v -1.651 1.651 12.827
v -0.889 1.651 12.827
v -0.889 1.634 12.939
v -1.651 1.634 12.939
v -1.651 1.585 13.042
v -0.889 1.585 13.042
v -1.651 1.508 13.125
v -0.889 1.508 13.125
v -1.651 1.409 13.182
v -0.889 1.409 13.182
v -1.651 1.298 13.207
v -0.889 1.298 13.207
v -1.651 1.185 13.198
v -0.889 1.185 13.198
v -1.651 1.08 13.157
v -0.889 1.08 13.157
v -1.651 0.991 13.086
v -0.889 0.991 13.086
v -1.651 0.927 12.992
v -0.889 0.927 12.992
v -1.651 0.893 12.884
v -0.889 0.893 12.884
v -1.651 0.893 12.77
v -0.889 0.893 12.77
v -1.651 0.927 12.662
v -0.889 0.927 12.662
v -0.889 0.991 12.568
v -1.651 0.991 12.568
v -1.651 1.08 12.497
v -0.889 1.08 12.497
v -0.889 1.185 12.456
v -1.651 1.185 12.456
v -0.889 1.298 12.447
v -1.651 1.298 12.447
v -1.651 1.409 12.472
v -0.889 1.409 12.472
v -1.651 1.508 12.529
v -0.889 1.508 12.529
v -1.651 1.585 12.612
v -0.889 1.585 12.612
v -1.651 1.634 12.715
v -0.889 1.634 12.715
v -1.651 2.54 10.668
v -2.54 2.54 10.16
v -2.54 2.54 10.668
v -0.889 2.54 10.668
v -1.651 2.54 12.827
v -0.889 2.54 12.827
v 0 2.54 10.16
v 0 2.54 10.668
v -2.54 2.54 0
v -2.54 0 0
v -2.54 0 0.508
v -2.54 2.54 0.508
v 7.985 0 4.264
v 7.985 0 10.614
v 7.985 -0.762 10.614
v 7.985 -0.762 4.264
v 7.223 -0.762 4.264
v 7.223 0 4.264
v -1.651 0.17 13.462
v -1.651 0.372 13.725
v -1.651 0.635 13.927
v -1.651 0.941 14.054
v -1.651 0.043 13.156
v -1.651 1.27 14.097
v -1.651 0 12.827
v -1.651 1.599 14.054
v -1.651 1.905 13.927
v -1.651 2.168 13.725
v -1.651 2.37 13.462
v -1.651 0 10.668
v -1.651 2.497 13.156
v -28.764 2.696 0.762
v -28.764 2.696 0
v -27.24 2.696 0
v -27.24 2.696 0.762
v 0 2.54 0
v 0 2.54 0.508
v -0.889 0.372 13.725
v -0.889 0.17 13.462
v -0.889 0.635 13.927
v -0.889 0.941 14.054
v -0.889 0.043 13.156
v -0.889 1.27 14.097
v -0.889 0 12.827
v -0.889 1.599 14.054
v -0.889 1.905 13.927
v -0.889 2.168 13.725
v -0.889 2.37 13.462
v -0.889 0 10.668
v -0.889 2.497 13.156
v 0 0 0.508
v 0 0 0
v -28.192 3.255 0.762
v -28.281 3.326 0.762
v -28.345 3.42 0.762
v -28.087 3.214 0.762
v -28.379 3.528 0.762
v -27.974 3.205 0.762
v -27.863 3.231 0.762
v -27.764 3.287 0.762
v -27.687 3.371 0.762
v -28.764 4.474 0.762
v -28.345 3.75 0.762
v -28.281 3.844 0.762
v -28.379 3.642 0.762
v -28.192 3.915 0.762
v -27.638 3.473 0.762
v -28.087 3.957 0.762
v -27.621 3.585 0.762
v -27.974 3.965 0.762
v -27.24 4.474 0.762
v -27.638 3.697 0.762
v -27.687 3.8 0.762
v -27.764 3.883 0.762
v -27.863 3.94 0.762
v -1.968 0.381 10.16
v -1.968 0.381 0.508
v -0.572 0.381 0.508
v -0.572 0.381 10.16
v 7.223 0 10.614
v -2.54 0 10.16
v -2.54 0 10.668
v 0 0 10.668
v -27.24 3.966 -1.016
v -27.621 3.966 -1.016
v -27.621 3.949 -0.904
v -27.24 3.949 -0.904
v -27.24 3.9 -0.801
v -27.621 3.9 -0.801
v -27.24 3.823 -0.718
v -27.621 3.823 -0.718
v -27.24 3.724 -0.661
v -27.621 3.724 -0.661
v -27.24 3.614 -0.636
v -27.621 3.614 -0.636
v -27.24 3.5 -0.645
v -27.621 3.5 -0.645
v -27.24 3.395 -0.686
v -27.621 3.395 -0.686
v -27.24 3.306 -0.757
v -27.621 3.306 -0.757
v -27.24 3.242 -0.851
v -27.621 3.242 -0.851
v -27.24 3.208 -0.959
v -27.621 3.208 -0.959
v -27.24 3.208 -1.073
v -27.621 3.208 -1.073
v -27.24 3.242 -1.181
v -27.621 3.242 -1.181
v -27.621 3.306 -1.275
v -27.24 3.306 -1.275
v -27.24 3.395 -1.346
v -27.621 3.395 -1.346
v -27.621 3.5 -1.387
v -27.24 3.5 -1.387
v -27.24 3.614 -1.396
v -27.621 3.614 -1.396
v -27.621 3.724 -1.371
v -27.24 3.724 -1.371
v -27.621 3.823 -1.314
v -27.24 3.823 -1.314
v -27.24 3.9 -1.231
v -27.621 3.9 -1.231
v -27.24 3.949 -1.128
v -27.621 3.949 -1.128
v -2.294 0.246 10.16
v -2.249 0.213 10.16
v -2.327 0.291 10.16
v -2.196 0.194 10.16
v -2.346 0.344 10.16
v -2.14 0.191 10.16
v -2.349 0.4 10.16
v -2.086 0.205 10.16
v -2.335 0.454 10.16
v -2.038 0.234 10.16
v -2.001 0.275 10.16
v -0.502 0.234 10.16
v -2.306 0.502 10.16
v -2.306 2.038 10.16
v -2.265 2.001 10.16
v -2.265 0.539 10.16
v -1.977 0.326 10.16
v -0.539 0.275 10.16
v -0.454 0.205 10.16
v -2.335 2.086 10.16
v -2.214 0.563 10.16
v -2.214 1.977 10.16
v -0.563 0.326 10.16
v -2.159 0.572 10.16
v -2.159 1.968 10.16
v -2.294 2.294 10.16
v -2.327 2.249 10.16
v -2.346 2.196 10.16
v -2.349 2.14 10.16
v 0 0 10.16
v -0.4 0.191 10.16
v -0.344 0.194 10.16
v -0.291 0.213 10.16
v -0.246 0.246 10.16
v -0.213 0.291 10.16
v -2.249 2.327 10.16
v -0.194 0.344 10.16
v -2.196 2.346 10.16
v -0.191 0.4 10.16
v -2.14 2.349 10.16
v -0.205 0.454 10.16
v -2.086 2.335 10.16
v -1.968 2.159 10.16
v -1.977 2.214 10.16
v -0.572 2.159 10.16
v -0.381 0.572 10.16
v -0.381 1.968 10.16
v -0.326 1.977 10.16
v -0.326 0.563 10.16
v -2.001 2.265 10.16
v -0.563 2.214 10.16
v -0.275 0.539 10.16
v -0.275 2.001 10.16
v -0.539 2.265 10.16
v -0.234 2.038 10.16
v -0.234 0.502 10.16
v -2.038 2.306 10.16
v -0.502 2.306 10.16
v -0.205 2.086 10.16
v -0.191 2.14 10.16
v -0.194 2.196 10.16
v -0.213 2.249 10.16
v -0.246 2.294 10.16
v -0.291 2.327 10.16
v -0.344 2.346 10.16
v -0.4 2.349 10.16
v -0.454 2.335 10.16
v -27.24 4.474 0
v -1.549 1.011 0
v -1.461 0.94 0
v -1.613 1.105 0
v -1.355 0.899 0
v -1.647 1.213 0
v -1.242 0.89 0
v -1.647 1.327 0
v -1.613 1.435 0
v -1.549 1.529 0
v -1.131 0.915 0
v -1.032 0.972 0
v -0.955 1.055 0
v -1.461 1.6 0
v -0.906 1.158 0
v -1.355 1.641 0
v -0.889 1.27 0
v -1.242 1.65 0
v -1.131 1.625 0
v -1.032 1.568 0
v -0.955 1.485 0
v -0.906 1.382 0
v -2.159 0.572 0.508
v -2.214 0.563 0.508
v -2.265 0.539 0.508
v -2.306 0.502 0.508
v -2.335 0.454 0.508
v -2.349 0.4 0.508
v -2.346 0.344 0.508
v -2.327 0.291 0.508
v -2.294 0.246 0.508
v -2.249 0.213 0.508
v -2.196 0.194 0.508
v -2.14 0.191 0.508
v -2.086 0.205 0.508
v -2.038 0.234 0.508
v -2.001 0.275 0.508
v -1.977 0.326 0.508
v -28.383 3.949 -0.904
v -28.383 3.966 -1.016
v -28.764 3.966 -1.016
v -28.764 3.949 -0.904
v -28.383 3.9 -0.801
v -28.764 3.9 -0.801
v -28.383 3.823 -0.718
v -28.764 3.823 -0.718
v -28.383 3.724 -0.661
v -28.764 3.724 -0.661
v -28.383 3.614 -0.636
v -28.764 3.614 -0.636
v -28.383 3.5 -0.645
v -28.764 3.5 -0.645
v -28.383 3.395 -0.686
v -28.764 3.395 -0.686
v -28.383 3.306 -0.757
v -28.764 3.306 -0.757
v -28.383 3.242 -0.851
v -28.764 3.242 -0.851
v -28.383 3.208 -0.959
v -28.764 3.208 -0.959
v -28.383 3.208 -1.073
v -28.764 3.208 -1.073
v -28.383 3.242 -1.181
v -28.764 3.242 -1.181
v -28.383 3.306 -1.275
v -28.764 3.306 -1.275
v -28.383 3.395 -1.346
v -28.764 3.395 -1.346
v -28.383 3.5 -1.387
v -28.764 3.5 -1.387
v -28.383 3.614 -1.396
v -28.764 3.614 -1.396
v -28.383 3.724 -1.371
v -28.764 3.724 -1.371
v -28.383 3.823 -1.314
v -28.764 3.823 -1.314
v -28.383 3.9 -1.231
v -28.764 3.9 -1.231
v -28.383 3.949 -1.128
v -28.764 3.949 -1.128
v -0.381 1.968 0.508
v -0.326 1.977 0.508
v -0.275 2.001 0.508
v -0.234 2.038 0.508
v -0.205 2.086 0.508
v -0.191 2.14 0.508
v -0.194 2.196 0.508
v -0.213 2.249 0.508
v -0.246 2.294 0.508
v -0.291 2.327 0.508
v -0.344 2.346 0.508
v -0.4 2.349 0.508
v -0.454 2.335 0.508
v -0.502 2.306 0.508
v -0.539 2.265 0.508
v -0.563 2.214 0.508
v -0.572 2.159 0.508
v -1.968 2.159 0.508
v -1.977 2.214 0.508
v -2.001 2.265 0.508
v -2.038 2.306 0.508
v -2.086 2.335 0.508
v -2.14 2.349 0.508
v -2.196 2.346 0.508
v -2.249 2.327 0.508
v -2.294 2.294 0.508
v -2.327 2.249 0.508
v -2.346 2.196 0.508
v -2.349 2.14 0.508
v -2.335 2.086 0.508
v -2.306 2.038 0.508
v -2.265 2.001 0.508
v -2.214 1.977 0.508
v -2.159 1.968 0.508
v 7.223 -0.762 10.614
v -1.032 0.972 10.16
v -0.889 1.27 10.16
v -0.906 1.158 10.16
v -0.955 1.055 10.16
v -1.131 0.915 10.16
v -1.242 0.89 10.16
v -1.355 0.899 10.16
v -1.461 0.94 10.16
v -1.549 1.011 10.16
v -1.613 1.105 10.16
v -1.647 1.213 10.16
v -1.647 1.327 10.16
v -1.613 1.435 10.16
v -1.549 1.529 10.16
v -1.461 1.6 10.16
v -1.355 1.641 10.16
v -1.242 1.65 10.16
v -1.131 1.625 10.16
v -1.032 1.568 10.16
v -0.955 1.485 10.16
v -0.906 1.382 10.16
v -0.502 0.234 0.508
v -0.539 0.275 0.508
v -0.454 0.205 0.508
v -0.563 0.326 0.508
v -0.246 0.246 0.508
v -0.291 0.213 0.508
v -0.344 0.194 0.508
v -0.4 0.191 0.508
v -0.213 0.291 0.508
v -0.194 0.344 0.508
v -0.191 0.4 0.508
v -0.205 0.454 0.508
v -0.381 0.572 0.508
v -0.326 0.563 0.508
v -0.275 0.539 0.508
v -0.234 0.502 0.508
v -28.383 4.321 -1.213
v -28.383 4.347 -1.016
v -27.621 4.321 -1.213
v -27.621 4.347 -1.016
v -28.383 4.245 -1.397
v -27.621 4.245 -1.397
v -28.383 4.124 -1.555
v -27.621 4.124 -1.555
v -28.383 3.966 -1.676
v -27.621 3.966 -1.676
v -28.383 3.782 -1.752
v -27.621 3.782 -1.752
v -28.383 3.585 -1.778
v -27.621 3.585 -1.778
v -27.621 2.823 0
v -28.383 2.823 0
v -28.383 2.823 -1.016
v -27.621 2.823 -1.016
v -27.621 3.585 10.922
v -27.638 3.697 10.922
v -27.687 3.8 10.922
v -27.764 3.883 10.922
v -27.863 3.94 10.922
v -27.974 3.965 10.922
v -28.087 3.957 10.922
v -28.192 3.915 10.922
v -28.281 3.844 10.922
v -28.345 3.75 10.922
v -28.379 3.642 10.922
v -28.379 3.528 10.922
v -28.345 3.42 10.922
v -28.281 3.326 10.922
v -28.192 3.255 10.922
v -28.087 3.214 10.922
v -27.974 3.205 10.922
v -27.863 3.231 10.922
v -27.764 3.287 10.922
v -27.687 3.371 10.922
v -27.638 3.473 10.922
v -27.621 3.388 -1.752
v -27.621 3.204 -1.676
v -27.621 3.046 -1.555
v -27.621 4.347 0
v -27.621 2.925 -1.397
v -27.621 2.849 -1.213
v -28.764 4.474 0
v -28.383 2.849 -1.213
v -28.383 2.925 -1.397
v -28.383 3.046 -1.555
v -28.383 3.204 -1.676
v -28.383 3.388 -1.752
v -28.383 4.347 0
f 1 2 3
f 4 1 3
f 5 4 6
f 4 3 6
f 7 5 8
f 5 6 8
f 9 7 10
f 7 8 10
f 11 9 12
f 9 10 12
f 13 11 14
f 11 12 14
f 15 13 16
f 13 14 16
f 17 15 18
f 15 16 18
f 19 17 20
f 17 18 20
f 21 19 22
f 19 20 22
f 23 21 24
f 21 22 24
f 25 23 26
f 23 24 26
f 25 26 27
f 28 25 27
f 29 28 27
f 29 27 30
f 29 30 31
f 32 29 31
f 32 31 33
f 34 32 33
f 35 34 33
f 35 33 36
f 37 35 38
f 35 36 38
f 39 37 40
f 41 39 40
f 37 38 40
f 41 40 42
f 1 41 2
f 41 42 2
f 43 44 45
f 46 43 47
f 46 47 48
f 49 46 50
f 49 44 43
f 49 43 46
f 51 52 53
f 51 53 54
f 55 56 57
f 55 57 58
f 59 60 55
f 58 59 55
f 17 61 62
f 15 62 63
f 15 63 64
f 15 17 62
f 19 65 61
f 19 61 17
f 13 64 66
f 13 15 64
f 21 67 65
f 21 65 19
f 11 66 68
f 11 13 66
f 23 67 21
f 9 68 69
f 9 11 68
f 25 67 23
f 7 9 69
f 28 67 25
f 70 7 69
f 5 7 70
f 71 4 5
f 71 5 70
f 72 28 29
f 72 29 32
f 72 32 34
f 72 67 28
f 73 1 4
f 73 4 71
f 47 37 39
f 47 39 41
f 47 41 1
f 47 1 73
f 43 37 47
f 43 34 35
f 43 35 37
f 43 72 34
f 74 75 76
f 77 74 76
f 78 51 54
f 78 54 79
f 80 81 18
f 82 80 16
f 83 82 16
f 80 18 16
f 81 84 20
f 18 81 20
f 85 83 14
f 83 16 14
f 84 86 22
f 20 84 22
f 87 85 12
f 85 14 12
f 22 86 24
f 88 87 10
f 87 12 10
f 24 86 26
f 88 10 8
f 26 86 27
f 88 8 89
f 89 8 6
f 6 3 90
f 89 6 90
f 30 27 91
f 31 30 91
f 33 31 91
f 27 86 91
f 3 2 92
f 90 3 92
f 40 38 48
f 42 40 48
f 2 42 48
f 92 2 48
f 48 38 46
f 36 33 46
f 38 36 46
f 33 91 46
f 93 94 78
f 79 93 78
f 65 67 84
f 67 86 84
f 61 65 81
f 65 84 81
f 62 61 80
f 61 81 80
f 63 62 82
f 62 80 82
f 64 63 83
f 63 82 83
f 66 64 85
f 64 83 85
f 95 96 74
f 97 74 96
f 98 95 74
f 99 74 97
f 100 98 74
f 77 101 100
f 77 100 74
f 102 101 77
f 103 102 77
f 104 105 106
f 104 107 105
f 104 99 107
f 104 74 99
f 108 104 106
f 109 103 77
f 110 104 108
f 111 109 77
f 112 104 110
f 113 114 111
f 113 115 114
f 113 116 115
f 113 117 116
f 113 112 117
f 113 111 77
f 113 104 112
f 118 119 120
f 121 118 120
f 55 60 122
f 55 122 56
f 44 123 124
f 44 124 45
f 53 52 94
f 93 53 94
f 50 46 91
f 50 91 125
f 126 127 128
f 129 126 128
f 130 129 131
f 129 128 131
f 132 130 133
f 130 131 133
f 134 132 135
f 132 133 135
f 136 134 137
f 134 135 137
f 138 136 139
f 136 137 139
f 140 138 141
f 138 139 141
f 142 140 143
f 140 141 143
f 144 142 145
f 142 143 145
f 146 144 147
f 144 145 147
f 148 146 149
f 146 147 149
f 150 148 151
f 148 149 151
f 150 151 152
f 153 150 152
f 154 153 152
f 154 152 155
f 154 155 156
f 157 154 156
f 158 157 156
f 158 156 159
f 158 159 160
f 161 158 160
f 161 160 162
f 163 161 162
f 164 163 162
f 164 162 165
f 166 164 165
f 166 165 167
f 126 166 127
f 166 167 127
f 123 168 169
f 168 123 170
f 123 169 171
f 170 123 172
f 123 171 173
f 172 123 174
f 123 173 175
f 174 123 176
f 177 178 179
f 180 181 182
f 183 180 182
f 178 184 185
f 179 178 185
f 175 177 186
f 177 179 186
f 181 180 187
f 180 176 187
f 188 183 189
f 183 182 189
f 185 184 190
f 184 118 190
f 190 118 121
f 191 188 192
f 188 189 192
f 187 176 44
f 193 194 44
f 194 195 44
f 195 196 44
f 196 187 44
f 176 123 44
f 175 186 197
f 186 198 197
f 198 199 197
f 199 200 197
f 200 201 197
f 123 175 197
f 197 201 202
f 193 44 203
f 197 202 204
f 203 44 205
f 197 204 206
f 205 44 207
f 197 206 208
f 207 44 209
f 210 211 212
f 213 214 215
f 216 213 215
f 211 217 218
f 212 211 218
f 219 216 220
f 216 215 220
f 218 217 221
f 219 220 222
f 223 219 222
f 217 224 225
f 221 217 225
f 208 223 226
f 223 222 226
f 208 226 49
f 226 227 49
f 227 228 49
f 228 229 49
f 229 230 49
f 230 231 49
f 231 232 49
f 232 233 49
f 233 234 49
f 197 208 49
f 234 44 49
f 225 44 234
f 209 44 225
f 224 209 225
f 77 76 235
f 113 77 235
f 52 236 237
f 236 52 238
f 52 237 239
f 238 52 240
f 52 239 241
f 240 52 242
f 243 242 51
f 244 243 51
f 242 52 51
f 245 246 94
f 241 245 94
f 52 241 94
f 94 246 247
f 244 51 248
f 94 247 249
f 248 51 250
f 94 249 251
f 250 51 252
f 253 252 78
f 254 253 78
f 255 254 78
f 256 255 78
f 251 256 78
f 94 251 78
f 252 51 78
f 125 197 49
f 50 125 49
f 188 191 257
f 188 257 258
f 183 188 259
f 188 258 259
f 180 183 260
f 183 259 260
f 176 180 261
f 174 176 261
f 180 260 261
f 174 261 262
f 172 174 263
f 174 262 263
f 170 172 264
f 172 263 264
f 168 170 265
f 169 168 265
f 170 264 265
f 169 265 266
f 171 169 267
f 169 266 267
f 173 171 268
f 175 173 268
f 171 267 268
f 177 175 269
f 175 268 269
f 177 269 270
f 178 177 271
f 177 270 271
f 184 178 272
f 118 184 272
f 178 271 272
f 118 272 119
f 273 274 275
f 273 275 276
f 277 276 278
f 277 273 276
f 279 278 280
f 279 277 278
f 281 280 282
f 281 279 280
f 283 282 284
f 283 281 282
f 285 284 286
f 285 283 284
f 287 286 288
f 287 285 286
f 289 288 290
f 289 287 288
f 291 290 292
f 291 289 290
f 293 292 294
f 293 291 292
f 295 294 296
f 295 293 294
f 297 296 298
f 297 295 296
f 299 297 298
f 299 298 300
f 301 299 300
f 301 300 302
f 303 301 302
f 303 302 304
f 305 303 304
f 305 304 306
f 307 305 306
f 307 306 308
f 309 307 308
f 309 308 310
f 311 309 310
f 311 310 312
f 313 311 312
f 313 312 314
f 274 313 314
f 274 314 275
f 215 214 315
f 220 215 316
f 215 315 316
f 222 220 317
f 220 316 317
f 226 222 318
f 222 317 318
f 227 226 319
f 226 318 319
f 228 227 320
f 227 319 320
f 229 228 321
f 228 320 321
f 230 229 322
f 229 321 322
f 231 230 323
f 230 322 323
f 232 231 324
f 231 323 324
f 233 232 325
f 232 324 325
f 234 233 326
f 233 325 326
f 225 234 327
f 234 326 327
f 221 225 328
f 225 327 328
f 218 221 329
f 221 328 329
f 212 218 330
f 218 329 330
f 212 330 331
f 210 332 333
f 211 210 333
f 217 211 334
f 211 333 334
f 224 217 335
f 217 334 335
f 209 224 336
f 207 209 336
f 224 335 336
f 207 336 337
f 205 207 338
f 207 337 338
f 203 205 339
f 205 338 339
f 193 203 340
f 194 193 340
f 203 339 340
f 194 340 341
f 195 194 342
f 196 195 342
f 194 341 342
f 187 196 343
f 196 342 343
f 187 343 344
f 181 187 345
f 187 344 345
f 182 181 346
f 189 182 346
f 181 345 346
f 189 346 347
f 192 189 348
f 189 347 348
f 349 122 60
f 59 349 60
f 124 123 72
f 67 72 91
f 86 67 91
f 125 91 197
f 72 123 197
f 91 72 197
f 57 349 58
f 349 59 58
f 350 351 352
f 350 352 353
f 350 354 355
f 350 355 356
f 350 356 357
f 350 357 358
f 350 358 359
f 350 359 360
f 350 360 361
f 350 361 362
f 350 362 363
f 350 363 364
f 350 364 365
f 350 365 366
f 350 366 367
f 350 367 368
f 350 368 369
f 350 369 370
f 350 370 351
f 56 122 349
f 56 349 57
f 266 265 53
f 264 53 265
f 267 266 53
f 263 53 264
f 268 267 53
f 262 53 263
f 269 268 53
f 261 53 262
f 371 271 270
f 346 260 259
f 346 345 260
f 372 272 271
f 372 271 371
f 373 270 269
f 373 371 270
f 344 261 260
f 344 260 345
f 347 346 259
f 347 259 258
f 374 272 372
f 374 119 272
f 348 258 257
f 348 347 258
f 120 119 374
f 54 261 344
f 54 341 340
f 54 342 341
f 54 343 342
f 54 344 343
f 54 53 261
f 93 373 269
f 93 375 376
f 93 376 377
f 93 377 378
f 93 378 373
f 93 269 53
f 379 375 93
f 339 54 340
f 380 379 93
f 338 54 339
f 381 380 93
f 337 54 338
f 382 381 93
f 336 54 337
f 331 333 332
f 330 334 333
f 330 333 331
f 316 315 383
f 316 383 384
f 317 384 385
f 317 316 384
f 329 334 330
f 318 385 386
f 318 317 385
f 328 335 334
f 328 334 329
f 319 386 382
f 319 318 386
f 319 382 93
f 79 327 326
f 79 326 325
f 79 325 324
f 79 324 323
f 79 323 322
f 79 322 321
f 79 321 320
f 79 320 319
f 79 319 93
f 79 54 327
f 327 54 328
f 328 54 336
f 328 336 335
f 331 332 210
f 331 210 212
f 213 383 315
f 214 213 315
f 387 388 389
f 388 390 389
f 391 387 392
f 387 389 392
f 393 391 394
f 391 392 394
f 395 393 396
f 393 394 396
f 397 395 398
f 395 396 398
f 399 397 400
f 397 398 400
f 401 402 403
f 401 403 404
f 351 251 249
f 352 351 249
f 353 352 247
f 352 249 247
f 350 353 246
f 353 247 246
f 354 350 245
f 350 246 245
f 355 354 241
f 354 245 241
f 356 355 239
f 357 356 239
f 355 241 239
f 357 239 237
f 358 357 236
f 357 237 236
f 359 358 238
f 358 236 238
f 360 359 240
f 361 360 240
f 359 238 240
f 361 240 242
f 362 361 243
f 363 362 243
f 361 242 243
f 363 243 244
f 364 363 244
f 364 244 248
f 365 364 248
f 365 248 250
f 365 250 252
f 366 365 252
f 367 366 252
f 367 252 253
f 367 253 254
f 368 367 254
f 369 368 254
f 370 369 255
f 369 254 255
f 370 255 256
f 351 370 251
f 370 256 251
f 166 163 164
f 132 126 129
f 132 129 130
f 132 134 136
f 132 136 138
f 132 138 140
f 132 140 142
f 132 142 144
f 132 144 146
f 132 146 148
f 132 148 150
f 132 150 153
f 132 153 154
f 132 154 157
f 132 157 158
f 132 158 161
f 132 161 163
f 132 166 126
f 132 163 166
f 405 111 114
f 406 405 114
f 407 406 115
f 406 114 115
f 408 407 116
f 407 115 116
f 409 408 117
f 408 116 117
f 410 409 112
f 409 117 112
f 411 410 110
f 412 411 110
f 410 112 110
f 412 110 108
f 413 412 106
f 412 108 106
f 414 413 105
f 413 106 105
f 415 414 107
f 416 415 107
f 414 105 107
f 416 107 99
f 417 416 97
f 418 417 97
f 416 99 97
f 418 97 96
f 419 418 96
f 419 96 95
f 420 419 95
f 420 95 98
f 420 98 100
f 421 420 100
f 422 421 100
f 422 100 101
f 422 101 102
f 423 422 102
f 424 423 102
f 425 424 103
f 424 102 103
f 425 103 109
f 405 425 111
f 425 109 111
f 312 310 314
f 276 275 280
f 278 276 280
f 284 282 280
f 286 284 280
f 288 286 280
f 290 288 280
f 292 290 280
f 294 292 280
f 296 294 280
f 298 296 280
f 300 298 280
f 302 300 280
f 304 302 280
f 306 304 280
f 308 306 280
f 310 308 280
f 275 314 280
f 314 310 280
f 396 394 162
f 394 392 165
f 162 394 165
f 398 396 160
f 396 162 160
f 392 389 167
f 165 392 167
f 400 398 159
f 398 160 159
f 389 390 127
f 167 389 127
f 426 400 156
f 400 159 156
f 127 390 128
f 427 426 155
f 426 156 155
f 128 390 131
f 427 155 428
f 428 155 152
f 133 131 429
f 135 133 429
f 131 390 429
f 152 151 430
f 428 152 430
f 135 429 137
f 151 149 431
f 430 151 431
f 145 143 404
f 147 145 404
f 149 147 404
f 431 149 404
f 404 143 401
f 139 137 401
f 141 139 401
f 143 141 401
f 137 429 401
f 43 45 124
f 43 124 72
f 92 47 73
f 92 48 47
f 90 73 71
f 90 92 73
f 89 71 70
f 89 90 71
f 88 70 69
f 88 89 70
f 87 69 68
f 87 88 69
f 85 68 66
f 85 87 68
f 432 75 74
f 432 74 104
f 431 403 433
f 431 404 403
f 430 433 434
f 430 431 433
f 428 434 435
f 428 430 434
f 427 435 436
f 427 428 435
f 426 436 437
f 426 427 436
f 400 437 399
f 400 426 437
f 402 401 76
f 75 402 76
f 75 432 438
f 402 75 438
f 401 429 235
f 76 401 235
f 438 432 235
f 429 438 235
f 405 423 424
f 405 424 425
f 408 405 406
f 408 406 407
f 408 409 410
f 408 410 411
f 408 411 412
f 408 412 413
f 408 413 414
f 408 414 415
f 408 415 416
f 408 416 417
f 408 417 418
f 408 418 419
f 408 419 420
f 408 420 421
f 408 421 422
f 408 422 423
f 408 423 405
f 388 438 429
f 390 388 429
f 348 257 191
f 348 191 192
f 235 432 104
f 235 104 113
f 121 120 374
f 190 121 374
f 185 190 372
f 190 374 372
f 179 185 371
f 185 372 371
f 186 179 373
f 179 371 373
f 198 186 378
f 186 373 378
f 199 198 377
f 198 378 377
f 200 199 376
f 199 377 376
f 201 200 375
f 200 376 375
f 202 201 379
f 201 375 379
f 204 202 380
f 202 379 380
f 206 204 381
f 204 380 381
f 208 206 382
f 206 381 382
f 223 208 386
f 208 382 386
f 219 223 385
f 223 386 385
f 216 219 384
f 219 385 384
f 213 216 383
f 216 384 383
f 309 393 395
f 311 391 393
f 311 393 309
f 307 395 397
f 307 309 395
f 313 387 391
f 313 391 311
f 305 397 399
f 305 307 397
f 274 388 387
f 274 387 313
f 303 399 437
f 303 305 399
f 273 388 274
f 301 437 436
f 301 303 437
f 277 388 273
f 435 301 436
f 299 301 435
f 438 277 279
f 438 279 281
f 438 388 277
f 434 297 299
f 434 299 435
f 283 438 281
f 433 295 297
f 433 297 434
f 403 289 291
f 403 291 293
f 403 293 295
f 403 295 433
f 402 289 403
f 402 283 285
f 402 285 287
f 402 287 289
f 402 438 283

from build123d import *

# Parameters (mm, degrees)
F0_W           = 2.54
F0_H           = 2.54
F1_DEPTH       = 0.508
F3_R           = 0.1905
F2_W           = 1.778
F2_H           = 1.778
F4_DEPTH       = 9.652
F5_W           = 2.54
F5_H           = 2.54
F6_DEPTH       = 0.508
F7_W           = 0.762
F7_H           = 2.54
F8_DEPTH       = 3.429
F9_R           = 1.26999
F10_R          = 0.381
F11_DEPTH      = 10.16
F12_W          = 1.524
F12_H          = 1.778
F13_DEPTH      = 0.762
F14_R          = 0.381
F15_DEPTH      = 10.16
F16_W          = 0.762
F16_H          = 1.524
F17_DEPTH      = 1.778
F18_R          = 0.76199
F20_R          = 0.381
F21_DEPTH      = 0.381
F21_DEPTH_BACK = 1.143
F19_R          = 0.381
F22_DEPTH      = 0.762
F23_W          = 0.762
F23_H          = 5.08
F24_DEPTH      = 0.762


# Not quite as in the source:
# - a fillet or chamfer is up to 0.001 mm smaller than in the source, because OpenCascade refuses the exact size
# - a pattern or mirror of a feature is missing from the dataset's text; its kind, count and spacing are read off the source's solid
# - a feature names something its author has since deleted; it is built from what else it names


with BuildPart() as f1:
    # F0 (on Top) → F1 (new body)
    with BuildSketch(Plane.XY):
        with Locations((-1.27, 1.27)):
            Rectangle(F0_W, F0_H)
    extrude(amount=F1_DEPTH)

    # F3 (on face) + F2 (on face) → F4 (join)
    with BuildSketch(Plane.XY.offset(0.508)):
        with Locations((-2.159, 0.381)):
            Circle(F3_R)
        with Locations((-0.381, 0.381)):
            Circle(F3_R)
        with Locations((-0.381, 2.159)):
            Circle(F3_R)
        with Locations((-2.159, 2.159)):
            Circle(F3_R)
    with BuildSketch(Plane.XY.offset(0.508)):
        with Locations((-1.27, 1.27)):
            Rectangle(F2_W, F2_H)
    extrude(amount=F4_DEPTH)

    # F5 (on face) → F6 (join)
    with BuildSketch(Plane.XY.offset(10.16)):
        with Locations((-1.27, 1.27)):
            Rectangle(F5_W, F5_H)
    extrude(amount=F6_DEPTH)

    # F7 (on face) → F8 (join)
    with BuildSketch(Plane.XY.offset(10.668)):
        with Locations((-1.27, 1.27)):
            Rectangle(F7_W, F7_H)
    extrude(amount=F8_DEPTH)

    # F9 (radius 1.27 in the source; OpenCascade refuses exactly that, so slightly less here)
    f9_edges = [f1.edges().sort_by_distance(p)[0] for p in [
        (-1.27, 0, 14.097),
        (-1.27, 2.54, 14.097),
    ]]
    fillet(f9_edges, radius=F9_R)

    # F10 (on face) → F11 (cut)
    with BuildSketch(Plane(origin=(0, 0, 0), x_dir=(1, 0, 0), z_dir=(0, 0, -1))):
        with Locations((-1.27, -1.27)):
            Circle(F10_R)
    extrude(amount=-F11_DEPTH, mode=Mode.SUBTRACT)

    # F19 (on face) → F22 (cut)
    with BuildSketch(Plane.YZ.offset(-0.889)):
        with Locations((1.27, 12.827)):
            Circle(F19_R)
    extrude(amount=-F22_DEPTH, mode=Mode.SUBTRACT)


with BuildPart() as f13:
    # F12 (on Top) → F13 (new body)
    with BuildSketch(Plane.XY):
        with Locations((-28.0019982215, 3.5851696832)):
            Rectangle(F12_W, F12_H)
    extrude(amount=F13_DEPTH)

    # F14 (on face) → F15 (join)
    with BuildSketch(Plane.XY.offset(0.762)):
        with Locations((-28.0019982215, 3.5851696832)):
            Circle(F14_R)
    extrude(amount=F15_DEPTH)

    # F16 (on face) → F17 (join)
    with BuildSketch(Plane(origin=(0, 0, 0), x_dir=(1, 0, 0), z_dir=(0, 0, -1))):
        with Locations((-28.0019982215, -3.5851696832)):
            Rectangle(F16_W, F16_H)
    extrude(amount=F17_DEPTH)

    # F18 (radius 0.762 in the source; OpenCascade refuses exactly that, so slightly less here)
    f18_edges = [f13.edges().sort_by_distance(p)[0] for p in [
        (-28.001998, 2.82317, -1.778),
        (-28.001998, 4.34717, -1.778),
    ]]
    fillet(f18_edges, radius=F18_R)

    # F20 (on face) → F21 (join, two sides)
    with BuildSketch(Plane.YZ.offset(-27.6209982215)) as f21_sk:
        with Locations((3.5851696832, -1.016)):
            Circle(F20_R)
    extrude(amount=F21_DEPTH)
    extrude(f21_sk.sketch, amount=-F21_DEPTH_BACK)


with BuildPart() as f24:
    # F23 (on Front) → F24 (new body)
    with BuildSketch(Plane.XZ):
        with Locations((7.6038887042, 6.803626753)):
            Rectangle(F23_W, F23_H)
    extrude(amount=F24_DEPTH)

    # F24_copies: F24 across plane


with BuildPart() as f24_1:
    add(f24.part)
    add(f24.part.mirror(Plane.XY.offset(7.438627)))


solid = Compound([f1.part, f13.part, f24_1.part])
